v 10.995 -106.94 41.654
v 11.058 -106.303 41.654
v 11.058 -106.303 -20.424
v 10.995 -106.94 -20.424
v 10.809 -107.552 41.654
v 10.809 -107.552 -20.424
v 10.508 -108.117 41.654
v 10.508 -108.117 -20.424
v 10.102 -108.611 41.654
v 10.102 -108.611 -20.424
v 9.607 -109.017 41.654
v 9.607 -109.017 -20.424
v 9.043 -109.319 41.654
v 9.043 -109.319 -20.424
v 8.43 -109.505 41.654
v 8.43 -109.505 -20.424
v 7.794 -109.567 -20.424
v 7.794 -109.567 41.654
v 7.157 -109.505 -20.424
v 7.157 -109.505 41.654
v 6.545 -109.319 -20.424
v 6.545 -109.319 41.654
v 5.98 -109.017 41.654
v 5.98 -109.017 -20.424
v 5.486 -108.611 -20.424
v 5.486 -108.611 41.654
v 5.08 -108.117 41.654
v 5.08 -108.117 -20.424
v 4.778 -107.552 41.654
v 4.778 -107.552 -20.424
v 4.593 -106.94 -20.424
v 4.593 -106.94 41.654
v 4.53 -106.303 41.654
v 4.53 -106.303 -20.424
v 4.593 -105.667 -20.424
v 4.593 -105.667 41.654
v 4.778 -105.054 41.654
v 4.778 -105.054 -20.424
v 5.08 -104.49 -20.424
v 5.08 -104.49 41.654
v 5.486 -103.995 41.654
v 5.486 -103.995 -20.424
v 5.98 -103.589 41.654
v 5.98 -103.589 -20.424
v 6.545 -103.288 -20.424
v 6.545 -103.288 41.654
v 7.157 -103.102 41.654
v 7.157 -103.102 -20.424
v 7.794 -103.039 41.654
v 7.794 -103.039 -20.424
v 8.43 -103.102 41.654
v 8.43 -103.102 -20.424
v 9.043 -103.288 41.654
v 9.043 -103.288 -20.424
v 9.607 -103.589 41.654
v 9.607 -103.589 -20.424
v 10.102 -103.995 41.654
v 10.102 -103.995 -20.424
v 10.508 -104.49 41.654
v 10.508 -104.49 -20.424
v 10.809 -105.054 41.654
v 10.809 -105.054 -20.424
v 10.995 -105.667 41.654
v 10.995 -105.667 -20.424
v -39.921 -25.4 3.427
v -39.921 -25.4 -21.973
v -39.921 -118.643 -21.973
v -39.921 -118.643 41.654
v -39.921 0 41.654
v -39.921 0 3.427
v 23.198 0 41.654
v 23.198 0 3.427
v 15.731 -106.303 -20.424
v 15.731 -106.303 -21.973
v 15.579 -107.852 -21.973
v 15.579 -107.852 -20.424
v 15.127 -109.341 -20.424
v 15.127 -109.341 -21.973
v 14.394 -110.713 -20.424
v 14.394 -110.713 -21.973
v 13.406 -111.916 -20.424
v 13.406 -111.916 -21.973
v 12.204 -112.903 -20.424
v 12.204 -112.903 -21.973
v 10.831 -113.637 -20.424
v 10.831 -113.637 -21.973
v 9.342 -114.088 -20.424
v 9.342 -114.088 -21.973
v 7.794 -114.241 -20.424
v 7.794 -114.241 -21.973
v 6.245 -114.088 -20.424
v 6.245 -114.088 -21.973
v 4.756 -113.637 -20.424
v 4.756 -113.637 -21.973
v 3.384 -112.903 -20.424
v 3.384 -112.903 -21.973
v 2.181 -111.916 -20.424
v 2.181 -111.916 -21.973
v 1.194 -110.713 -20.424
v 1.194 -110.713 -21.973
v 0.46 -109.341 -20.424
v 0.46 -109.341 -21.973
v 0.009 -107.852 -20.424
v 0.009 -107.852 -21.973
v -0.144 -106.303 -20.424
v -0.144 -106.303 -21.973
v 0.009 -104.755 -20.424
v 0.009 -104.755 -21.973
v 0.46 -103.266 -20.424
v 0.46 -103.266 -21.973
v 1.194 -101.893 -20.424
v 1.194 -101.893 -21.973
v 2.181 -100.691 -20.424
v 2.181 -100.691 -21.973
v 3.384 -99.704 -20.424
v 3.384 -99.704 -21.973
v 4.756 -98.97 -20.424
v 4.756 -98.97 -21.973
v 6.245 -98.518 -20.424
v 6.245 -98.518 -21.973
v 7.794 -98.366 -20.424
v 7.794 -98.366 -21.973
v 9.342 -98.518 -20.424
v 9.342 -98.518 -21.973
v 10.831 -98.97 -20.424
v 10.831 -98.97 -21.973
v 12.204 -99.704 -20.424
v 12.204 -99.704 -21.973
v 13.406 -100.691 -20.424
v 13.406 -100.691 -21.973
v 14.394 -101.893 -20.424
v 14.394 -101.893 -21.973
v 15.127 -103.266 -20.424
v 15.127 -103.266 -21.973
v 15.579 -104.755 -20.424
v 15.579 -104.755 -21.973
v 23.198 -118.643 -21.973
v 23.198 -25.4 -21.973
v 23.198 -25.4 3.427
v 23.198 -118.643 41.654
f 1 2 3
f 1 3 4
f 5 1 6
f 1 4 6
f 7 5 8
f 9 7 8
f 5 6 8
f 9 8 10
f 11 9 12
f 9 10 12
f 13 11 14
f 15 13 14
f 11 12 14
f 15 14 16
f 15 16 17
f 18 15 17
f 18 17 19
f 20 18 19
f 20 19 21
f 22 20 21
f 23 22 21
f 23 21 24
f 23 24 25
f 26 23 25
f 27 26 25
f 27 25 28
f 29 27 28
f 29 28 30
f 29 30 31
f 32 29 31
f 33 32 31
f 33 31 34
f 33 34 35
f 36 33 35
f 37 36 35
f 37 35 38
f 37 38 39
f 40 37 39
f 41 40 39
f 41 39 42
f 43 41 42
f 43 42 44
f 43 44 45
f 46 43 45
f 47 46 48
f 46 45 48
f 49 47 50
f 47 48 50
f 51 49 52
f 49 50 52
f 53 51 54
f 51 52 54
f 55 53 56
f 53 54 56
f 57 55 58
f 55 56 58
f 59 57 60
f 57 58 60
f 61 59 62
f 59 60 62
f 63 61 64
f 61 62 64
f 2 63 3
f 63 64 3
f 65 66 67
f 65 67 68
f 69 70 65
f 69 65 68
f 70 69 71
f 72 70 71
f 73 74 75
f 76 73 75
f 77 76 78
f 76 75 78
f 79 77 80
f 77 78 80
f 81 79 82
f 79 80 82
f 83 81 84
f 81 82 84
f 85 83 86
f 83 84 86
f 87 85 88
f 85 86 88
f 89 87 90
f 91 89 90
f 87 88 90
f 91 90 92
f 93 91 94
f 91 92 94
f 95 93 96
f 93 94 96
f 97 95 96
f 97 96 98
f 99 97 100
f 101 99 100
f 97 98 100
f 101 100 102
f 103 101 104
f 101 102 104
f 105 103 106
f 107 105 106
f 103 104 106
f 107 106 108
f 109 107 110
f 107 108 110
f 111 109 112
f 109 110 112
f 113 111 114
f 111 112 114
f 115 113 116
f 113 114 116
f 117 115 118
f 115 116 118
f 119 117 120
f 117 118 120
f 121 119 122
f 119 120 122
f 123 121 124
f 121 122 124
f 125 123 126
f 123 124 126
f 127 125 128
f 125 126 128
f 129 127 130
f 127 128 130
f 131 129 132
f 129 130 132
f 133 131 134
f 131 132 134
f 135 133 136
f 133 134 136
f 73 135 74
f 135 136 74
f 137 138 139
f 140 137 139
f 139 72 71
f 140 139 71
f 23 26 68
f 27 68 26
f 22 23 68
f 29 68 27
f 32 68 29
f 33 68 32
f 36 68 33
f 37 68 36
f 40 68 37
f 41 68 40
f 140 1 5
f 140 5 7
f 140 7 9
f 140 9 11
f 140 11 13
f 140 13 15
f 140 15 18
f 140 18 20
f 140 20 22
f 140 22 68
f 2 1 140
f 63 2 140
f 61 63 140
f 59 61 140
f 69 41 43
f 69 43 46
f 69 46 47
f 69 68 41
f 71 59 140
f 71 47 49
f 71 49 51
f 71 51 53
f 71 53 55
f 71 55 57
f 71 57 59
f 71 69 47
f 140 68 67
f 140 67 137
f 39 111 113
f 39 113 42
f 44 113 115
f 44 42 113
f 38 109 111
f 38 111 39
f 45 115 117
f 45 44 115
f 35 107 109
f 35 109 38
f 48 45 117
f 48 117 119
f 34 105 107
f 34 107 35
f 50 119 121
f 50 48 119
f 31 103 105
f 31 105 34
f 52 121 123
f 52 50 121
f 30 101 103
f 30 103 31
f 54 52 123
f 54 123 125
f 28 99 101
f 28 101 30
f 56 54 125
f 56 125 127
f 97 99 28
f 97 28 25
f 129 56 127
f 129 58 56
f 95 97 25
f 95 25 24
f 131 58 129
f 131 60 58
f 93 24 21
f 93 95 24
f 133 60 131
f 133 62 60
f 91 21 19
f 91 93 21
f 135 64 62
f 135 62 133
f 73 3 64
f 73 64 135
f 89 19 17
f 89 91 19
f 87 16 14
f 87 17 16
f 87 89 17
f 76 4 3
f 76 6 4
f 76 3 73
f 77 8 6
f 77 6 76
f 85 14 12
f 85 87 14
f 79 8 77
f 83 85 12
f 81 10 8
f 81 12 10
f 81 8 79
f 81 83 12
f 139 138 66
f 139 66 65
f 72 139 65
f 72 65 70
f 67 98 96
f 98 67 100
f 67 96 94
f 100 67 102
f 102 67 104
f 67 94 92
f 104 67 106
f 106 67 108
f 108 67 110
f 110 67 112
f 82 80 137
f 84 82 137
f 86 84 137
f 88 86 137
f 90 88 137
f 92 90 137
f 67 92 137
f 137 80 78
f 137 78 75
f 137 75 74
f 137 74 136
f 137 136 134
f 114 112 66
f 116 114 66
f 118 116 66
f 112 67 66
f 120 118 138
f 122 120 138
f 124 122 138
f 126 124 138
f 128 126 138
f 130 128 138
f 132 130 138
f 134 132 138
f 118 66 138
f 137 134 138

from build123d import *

# Parameters (mm, degrees)
F0_W     = 63.119
F0_H     = 63.627
F1_DEPTH = 118.6434
F2_W     = 25.4
F2_H     = 25.4
F3_DEPTH = 63.119
F4_R     = 3.2639
F5_DEPTH = 63.627
F6_R     = 7.9375
F7_DEPTH = 1.5494


# Not quite as in the source:
# - a feature names something its author has since deleted; it is built from what else it names


with BuildPart() as f1:
    # F0 (on Front) → F1 (new body)
    with BuildSketch(Plane.XZ):
        with Locations((-8.3619841438, 9.8403063603)):
            Rectangle(F0_W, F0_H)
    extrude(amount=F1_DEPTH)

    # F2 (on face) → F3 (cut, through all)
    with BuildSketch(Plane.YZ.offset(23.1975158562)):
        with Locations((-12.7, -9.2731936397)):
            Rectangle(F2_W, F2_H)
    extrude(amount=-F3_DEPTH, mode=Mode.SUBTRACT)

    # F4 (on face) → F5 (cut, through all)
    with BuildSketch(Plane(origin=(0, 0, -21.9731936397), x_dir=(1, 0, 0), z_dir=(0, 0, -1))):
        with Locations((7.7937371098, 106.303319335)):
            Circle(F4_R)
    extrude(amount=-F5_DEPTH, mode=Mode.SUBTRACT)

    # F6 (on face) → F7 (cut)
    with BuildSketch(Plane(origin=(0, 0, -21.9731936397), x_dir=(1, 0, 0), z_dir=(0, 0, -1))):
        with Locations((7.7937371098, 106.303319335)):
            Circle(F6_R)
    extrude(amount=-F7_DEPTH, mode=Mode.SUBTRACT)


solid = f1.part
